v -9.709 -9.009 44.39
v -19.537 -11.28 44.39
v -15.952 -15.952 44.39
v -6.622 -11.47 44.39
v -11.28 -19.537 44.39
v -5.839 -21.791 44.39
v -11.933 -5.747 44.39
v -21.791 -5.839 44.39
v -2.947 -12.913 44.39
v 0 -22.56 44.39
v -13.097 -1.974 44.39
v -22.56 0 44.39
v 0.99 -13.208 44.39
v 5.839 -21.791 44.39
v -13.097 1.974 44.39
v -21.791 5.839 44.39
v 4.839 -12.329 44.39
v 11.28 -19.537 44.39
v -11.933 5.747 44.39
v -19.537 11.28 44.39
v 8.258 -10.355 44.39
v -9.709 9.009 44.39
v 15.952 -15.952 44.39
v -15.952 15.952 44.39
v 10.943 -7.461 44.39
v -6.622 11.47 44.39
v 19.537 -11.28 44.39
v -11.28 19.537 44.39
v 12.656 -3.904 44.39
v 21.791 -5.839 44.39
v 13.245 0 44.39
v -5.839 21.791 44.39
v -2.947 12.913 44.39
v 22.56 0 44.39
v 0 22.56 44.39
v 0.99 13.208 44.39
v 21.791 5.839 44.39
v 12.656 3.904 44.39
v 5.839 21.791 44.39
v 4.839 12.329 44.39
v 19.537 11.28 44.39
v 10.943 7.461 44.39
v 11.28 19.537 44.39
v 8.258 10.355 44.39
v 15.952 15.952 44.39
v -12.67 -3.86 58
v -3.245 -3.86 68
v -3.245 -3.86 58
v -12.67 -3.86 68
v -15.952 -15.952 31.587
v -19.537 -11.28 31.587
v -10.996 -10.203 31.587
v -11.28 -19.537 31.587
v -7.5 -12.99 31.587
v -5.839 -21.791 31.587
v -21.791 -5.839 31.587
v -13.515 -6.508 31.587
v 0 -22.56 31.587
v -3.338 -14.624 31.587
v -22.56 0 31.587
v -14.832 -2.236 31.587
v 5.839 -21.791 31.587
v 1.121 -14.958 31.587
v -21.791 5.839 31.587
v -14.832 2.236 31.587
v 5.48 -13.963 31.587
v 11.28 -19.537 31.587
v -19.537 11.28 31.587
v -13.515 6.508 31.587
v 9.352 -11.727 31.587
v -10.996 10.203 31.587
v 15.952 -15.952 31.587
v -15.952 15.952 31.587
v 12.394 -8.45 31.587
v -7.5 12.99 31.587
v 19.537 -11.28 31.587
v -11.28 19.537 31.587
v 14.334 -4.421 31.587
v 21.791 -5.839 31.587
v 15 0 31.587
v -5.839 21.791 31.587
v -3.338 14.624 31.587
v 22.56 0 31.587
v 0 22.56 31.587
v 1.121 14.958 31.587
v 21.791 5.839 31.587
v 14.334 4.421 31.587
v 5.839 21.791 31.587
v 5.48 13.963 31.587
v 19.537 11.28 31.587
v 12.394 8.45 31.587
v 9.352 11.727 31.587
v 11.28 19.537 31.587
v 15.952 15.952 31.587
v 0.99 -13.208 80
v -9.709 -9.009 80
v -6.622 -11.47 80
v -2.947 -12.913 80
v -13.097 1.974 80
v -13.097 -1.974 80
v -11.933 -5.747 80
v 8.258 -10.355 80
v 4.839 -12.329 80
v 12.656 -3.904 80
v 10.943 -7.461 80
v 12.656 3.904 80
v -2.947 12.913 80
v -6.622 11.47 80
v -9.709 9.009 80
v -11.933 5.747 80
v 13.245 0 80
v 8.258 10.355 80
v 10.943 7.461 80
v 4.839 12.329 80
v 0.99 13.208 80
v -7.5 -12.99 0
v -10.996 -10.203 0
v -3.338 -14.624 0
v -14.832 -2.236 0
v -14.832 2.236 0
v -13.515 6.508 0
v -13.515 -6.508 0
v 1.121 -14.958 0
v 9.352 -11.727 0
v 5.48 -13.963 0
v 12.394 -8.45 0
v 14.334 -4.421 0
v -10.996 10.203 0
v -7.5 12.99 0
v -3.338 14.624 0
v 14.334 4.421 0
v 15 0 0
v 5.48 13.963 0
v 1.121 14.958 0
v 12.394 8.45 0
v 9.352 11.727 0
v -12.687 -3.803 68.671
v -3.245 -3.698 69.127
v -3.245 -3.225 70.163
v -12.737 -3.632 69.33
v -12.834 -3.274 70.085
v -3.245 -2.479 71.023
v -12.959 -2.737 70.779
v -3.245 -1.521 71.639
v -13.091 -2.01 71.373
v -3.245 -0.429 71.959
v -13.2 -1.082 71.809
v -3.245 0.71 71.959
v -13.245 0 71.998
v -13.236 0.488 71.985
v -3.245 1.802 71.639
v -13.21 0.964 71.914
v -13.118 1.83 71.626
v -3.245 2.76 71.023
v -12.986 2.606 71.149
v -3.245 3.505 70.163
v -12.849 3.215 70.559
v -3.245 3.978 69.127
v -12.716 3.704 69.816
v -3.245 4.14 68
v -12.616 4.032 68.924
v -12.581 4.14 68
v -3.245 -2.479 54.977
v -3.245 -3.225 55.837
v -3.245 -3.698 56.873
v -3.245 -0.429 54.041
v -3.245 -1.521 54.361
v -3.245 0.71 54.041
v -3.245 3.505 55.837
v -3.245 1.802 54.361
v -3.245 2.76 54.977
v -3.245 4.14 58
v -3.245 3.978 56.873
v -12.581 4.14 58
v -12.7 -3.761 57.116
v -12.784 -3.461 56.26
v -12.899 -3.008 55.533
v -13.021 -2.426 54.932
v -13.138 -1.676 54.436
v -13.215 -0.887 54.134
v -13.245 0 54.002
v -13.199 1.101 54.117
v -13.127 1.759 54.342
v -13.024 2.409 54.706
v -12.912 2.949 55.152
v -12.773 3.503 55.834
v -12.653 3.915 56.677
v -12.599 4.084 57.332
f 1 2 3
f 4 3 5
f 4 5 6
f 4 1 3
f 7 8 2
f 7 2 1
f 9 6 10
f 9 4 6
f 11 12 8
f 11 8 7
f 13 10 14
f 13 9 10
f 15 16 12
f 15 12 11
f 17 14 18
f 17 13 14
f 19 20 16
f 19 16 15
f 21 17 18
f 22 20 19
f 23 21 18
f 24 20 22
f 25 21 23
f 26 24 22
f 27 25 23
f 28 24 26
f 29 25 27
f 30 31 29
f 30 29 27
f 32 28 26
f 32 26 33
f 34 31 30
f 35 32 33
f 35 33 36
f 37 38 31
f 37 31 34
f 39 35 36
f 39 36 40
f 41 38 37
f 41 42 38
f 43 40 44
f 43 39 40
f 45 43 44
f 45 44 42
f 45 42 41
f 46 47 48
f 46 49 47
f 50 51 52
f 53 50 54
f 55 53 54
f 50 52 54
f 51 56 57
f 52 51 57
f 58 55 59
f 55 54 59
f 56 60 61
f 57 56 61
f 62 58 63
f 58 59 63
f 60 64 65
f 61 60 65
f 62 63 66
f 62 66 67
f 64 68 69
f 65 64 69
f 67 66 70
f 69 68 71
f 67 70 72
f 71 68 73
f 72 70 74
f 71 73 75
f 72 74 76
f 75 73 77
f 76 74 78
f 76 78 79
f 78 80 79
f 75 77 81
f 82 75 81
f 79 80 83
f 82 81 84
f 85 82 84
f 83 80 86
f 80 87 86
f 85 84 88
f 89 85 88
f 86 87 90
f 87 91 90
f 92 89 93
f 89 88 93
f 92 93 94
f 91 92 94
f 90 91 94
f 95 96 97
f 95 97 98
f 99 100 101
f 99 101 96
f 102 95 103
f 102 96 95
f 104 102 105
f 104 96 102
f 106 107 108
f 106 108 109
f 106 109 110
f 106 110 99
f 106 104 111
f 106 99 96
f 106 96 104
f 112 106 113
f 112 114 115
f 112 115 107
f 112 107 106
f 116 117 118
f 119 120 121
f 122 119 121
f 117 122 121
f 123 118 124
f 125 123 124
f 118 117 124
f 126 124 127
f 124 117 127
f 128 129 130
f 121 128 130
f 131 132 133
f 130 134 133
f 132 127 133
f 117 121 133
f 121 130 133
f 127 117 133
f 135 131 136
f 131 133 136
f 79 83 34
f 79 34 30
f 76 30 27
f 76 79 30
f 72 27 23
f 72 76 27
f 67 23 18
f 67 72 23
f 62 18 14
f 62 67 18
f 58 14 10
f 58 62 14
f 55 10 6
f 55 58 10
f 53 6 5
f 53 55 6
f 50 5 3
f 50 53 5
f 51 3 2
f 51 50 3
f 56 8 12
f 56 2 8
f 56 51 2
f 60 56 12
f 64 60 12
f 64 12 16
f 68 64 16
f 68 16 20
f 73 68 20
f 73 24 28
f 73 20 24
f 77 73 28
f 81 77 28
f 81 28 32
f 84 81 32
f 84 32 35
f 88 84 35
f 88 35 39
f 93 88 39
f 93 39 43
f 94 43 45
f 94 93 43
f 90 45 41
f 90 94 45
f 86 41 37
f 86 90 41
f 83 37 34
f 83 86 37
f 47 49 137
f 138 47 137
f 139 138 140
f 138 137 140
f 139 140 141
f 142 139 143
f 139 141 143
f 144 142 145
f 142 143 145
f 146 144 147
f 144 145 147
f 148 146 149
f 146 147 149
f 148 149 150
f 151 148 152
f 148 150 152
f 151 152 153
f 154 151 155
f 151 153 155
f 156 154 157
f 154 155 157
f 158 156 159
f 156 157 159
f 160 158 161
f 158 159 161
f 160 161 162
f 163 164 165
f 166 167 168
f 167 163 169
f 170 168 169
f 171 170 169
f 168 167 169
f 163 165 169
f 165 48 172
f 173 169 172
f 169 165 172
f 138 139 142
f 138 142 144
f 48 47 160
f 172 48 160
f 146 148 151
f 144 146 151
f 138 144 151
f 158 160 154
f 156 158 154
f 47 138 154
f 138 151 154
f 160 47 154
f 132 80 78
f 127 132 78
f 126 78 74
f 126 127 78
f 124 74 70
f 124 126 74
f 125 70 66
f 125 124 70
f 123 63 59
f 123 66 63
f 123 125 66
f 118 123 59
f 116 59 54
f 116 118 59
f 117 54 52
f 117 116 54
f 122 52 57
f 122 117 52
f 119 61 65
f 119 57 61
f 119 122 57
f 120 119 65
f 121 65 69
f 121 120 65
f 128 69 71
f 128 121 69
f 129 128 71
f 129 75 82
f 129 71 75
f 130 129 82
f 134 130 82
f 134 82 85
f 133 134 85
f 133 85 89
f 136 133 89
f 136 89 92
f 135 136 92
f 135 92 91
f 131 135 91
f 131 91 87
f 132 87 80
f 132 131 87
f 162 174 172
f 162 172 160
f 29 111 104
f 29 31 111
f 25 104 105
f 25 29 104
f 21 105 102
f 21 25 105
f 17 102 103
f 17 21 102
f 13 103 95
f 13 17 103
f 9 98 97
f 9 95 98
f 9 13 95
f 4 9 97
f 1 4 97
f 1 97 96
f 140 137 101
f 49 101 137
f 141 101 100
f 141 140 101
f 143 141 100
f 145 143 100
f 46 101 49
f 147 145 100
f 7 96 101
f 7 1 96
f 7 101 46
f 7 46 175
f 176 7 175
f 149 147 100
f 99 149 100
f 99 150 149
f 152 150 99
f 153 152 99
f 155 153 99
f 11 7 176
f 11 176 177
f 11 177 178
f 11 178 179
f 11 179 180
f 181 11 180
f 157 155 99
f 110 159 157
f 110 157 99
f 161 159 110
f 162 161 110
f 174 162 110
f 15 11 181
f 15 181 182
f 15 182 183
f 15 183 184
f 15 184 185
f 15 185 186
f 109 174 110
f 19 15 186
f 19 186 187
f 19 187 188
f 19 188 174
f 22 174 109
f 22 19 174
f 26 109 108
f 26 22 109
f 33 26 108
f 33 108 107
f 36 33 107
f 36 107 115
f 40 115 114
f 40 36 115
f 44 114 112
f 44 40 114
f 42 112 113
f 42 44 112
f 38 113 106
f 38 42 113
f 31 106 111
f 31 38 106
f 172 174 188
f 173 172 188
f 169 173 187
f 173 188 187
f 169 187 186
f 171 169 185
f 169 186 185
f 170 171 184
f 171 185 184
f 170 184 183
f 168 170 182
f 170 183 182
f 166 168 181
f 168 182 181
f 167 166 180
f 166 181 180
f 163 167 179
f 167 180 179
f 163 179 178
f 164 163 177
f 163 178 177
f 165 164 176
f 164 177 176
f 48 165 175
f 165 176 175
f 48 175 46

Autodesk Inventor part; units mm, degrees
ref_plane "XZ Plane" through (0, 0, 0) normal (0, 1, 0) x (-1, 0, 0)
ref_plane "XY Plane" through (0, 0, 0) normal (0, 0, 1) x (1, 0, 0)
sketch "Sketch2" plane through (0, 0, 0) normal (0, 1, 0) x (-1, 0, 0)
  line L0 (0, 0) -> (0, 80)
  line L1 (0, 80) -> (-13.2447, 80)
  line L2 (-13.2447, 80) -> (-13.2447, 44.3901)
  line L3 (-22.5598, 44.3901) -> (-22.5598, 31.5867)
  line L4 (-22.5598, 31.5867) -> (-15, 31.5867)
  line L5 (-15, 31.5867) -> (-15, 0)
  line L6 (-15, 0) -> (0, 0)
  line L7 (-22.5598, 44.3901) -> (-13.2447, 44.3901)
  dimension "d6" = 30
  dimension "d7" = 80
revolve "Revolution1" add sketch "Sketch2" angle 360 about axis through (0, 0, 0) along (0, 0, 1)
ref_plane "Work Plane1" through (-13.2447, 0, 62.195) normal (1, 0, 0) x (0, 1, 0)
sketch "Sketch3" plane through (-13.2447, 0, 62.195) normal (1, 0, 0) x (0, 1, 0)
  line L0 (13.2447, -17.805) -> (-13.2447, -17.805) projected
  line L1 (13.2447, 17.805) -> (-13.2447, 17.805) projected
  line L2 (0.1403, 5.805) -> (0.1403, -4.195) construction
  line L3 (-3.8597, 5.805) -> (-3.8597, -4.195)
  line L4 (4.1403, -4.195) -> (4.1403, 5.805)
  arc A0 (4.1403, 5.805) -> (-3.8597, 5.805) centre (0.1403, 5.805) ccw
  arc A1 (-3.8597, -4.195) -> (4.1403, -4.195) centre (0.1403, -4.195) ccw
  point P0 (0, -62.195)
  point P1 (0.1403, 0.805)
  dimension "d8" = 12
  dimension "d9" = 8
  dimension "d10" = 10
extrude "Extrusion2" cut sketch "Sketch3" along normal blind 10
properties part number "NVPH-312 augur shaft"
